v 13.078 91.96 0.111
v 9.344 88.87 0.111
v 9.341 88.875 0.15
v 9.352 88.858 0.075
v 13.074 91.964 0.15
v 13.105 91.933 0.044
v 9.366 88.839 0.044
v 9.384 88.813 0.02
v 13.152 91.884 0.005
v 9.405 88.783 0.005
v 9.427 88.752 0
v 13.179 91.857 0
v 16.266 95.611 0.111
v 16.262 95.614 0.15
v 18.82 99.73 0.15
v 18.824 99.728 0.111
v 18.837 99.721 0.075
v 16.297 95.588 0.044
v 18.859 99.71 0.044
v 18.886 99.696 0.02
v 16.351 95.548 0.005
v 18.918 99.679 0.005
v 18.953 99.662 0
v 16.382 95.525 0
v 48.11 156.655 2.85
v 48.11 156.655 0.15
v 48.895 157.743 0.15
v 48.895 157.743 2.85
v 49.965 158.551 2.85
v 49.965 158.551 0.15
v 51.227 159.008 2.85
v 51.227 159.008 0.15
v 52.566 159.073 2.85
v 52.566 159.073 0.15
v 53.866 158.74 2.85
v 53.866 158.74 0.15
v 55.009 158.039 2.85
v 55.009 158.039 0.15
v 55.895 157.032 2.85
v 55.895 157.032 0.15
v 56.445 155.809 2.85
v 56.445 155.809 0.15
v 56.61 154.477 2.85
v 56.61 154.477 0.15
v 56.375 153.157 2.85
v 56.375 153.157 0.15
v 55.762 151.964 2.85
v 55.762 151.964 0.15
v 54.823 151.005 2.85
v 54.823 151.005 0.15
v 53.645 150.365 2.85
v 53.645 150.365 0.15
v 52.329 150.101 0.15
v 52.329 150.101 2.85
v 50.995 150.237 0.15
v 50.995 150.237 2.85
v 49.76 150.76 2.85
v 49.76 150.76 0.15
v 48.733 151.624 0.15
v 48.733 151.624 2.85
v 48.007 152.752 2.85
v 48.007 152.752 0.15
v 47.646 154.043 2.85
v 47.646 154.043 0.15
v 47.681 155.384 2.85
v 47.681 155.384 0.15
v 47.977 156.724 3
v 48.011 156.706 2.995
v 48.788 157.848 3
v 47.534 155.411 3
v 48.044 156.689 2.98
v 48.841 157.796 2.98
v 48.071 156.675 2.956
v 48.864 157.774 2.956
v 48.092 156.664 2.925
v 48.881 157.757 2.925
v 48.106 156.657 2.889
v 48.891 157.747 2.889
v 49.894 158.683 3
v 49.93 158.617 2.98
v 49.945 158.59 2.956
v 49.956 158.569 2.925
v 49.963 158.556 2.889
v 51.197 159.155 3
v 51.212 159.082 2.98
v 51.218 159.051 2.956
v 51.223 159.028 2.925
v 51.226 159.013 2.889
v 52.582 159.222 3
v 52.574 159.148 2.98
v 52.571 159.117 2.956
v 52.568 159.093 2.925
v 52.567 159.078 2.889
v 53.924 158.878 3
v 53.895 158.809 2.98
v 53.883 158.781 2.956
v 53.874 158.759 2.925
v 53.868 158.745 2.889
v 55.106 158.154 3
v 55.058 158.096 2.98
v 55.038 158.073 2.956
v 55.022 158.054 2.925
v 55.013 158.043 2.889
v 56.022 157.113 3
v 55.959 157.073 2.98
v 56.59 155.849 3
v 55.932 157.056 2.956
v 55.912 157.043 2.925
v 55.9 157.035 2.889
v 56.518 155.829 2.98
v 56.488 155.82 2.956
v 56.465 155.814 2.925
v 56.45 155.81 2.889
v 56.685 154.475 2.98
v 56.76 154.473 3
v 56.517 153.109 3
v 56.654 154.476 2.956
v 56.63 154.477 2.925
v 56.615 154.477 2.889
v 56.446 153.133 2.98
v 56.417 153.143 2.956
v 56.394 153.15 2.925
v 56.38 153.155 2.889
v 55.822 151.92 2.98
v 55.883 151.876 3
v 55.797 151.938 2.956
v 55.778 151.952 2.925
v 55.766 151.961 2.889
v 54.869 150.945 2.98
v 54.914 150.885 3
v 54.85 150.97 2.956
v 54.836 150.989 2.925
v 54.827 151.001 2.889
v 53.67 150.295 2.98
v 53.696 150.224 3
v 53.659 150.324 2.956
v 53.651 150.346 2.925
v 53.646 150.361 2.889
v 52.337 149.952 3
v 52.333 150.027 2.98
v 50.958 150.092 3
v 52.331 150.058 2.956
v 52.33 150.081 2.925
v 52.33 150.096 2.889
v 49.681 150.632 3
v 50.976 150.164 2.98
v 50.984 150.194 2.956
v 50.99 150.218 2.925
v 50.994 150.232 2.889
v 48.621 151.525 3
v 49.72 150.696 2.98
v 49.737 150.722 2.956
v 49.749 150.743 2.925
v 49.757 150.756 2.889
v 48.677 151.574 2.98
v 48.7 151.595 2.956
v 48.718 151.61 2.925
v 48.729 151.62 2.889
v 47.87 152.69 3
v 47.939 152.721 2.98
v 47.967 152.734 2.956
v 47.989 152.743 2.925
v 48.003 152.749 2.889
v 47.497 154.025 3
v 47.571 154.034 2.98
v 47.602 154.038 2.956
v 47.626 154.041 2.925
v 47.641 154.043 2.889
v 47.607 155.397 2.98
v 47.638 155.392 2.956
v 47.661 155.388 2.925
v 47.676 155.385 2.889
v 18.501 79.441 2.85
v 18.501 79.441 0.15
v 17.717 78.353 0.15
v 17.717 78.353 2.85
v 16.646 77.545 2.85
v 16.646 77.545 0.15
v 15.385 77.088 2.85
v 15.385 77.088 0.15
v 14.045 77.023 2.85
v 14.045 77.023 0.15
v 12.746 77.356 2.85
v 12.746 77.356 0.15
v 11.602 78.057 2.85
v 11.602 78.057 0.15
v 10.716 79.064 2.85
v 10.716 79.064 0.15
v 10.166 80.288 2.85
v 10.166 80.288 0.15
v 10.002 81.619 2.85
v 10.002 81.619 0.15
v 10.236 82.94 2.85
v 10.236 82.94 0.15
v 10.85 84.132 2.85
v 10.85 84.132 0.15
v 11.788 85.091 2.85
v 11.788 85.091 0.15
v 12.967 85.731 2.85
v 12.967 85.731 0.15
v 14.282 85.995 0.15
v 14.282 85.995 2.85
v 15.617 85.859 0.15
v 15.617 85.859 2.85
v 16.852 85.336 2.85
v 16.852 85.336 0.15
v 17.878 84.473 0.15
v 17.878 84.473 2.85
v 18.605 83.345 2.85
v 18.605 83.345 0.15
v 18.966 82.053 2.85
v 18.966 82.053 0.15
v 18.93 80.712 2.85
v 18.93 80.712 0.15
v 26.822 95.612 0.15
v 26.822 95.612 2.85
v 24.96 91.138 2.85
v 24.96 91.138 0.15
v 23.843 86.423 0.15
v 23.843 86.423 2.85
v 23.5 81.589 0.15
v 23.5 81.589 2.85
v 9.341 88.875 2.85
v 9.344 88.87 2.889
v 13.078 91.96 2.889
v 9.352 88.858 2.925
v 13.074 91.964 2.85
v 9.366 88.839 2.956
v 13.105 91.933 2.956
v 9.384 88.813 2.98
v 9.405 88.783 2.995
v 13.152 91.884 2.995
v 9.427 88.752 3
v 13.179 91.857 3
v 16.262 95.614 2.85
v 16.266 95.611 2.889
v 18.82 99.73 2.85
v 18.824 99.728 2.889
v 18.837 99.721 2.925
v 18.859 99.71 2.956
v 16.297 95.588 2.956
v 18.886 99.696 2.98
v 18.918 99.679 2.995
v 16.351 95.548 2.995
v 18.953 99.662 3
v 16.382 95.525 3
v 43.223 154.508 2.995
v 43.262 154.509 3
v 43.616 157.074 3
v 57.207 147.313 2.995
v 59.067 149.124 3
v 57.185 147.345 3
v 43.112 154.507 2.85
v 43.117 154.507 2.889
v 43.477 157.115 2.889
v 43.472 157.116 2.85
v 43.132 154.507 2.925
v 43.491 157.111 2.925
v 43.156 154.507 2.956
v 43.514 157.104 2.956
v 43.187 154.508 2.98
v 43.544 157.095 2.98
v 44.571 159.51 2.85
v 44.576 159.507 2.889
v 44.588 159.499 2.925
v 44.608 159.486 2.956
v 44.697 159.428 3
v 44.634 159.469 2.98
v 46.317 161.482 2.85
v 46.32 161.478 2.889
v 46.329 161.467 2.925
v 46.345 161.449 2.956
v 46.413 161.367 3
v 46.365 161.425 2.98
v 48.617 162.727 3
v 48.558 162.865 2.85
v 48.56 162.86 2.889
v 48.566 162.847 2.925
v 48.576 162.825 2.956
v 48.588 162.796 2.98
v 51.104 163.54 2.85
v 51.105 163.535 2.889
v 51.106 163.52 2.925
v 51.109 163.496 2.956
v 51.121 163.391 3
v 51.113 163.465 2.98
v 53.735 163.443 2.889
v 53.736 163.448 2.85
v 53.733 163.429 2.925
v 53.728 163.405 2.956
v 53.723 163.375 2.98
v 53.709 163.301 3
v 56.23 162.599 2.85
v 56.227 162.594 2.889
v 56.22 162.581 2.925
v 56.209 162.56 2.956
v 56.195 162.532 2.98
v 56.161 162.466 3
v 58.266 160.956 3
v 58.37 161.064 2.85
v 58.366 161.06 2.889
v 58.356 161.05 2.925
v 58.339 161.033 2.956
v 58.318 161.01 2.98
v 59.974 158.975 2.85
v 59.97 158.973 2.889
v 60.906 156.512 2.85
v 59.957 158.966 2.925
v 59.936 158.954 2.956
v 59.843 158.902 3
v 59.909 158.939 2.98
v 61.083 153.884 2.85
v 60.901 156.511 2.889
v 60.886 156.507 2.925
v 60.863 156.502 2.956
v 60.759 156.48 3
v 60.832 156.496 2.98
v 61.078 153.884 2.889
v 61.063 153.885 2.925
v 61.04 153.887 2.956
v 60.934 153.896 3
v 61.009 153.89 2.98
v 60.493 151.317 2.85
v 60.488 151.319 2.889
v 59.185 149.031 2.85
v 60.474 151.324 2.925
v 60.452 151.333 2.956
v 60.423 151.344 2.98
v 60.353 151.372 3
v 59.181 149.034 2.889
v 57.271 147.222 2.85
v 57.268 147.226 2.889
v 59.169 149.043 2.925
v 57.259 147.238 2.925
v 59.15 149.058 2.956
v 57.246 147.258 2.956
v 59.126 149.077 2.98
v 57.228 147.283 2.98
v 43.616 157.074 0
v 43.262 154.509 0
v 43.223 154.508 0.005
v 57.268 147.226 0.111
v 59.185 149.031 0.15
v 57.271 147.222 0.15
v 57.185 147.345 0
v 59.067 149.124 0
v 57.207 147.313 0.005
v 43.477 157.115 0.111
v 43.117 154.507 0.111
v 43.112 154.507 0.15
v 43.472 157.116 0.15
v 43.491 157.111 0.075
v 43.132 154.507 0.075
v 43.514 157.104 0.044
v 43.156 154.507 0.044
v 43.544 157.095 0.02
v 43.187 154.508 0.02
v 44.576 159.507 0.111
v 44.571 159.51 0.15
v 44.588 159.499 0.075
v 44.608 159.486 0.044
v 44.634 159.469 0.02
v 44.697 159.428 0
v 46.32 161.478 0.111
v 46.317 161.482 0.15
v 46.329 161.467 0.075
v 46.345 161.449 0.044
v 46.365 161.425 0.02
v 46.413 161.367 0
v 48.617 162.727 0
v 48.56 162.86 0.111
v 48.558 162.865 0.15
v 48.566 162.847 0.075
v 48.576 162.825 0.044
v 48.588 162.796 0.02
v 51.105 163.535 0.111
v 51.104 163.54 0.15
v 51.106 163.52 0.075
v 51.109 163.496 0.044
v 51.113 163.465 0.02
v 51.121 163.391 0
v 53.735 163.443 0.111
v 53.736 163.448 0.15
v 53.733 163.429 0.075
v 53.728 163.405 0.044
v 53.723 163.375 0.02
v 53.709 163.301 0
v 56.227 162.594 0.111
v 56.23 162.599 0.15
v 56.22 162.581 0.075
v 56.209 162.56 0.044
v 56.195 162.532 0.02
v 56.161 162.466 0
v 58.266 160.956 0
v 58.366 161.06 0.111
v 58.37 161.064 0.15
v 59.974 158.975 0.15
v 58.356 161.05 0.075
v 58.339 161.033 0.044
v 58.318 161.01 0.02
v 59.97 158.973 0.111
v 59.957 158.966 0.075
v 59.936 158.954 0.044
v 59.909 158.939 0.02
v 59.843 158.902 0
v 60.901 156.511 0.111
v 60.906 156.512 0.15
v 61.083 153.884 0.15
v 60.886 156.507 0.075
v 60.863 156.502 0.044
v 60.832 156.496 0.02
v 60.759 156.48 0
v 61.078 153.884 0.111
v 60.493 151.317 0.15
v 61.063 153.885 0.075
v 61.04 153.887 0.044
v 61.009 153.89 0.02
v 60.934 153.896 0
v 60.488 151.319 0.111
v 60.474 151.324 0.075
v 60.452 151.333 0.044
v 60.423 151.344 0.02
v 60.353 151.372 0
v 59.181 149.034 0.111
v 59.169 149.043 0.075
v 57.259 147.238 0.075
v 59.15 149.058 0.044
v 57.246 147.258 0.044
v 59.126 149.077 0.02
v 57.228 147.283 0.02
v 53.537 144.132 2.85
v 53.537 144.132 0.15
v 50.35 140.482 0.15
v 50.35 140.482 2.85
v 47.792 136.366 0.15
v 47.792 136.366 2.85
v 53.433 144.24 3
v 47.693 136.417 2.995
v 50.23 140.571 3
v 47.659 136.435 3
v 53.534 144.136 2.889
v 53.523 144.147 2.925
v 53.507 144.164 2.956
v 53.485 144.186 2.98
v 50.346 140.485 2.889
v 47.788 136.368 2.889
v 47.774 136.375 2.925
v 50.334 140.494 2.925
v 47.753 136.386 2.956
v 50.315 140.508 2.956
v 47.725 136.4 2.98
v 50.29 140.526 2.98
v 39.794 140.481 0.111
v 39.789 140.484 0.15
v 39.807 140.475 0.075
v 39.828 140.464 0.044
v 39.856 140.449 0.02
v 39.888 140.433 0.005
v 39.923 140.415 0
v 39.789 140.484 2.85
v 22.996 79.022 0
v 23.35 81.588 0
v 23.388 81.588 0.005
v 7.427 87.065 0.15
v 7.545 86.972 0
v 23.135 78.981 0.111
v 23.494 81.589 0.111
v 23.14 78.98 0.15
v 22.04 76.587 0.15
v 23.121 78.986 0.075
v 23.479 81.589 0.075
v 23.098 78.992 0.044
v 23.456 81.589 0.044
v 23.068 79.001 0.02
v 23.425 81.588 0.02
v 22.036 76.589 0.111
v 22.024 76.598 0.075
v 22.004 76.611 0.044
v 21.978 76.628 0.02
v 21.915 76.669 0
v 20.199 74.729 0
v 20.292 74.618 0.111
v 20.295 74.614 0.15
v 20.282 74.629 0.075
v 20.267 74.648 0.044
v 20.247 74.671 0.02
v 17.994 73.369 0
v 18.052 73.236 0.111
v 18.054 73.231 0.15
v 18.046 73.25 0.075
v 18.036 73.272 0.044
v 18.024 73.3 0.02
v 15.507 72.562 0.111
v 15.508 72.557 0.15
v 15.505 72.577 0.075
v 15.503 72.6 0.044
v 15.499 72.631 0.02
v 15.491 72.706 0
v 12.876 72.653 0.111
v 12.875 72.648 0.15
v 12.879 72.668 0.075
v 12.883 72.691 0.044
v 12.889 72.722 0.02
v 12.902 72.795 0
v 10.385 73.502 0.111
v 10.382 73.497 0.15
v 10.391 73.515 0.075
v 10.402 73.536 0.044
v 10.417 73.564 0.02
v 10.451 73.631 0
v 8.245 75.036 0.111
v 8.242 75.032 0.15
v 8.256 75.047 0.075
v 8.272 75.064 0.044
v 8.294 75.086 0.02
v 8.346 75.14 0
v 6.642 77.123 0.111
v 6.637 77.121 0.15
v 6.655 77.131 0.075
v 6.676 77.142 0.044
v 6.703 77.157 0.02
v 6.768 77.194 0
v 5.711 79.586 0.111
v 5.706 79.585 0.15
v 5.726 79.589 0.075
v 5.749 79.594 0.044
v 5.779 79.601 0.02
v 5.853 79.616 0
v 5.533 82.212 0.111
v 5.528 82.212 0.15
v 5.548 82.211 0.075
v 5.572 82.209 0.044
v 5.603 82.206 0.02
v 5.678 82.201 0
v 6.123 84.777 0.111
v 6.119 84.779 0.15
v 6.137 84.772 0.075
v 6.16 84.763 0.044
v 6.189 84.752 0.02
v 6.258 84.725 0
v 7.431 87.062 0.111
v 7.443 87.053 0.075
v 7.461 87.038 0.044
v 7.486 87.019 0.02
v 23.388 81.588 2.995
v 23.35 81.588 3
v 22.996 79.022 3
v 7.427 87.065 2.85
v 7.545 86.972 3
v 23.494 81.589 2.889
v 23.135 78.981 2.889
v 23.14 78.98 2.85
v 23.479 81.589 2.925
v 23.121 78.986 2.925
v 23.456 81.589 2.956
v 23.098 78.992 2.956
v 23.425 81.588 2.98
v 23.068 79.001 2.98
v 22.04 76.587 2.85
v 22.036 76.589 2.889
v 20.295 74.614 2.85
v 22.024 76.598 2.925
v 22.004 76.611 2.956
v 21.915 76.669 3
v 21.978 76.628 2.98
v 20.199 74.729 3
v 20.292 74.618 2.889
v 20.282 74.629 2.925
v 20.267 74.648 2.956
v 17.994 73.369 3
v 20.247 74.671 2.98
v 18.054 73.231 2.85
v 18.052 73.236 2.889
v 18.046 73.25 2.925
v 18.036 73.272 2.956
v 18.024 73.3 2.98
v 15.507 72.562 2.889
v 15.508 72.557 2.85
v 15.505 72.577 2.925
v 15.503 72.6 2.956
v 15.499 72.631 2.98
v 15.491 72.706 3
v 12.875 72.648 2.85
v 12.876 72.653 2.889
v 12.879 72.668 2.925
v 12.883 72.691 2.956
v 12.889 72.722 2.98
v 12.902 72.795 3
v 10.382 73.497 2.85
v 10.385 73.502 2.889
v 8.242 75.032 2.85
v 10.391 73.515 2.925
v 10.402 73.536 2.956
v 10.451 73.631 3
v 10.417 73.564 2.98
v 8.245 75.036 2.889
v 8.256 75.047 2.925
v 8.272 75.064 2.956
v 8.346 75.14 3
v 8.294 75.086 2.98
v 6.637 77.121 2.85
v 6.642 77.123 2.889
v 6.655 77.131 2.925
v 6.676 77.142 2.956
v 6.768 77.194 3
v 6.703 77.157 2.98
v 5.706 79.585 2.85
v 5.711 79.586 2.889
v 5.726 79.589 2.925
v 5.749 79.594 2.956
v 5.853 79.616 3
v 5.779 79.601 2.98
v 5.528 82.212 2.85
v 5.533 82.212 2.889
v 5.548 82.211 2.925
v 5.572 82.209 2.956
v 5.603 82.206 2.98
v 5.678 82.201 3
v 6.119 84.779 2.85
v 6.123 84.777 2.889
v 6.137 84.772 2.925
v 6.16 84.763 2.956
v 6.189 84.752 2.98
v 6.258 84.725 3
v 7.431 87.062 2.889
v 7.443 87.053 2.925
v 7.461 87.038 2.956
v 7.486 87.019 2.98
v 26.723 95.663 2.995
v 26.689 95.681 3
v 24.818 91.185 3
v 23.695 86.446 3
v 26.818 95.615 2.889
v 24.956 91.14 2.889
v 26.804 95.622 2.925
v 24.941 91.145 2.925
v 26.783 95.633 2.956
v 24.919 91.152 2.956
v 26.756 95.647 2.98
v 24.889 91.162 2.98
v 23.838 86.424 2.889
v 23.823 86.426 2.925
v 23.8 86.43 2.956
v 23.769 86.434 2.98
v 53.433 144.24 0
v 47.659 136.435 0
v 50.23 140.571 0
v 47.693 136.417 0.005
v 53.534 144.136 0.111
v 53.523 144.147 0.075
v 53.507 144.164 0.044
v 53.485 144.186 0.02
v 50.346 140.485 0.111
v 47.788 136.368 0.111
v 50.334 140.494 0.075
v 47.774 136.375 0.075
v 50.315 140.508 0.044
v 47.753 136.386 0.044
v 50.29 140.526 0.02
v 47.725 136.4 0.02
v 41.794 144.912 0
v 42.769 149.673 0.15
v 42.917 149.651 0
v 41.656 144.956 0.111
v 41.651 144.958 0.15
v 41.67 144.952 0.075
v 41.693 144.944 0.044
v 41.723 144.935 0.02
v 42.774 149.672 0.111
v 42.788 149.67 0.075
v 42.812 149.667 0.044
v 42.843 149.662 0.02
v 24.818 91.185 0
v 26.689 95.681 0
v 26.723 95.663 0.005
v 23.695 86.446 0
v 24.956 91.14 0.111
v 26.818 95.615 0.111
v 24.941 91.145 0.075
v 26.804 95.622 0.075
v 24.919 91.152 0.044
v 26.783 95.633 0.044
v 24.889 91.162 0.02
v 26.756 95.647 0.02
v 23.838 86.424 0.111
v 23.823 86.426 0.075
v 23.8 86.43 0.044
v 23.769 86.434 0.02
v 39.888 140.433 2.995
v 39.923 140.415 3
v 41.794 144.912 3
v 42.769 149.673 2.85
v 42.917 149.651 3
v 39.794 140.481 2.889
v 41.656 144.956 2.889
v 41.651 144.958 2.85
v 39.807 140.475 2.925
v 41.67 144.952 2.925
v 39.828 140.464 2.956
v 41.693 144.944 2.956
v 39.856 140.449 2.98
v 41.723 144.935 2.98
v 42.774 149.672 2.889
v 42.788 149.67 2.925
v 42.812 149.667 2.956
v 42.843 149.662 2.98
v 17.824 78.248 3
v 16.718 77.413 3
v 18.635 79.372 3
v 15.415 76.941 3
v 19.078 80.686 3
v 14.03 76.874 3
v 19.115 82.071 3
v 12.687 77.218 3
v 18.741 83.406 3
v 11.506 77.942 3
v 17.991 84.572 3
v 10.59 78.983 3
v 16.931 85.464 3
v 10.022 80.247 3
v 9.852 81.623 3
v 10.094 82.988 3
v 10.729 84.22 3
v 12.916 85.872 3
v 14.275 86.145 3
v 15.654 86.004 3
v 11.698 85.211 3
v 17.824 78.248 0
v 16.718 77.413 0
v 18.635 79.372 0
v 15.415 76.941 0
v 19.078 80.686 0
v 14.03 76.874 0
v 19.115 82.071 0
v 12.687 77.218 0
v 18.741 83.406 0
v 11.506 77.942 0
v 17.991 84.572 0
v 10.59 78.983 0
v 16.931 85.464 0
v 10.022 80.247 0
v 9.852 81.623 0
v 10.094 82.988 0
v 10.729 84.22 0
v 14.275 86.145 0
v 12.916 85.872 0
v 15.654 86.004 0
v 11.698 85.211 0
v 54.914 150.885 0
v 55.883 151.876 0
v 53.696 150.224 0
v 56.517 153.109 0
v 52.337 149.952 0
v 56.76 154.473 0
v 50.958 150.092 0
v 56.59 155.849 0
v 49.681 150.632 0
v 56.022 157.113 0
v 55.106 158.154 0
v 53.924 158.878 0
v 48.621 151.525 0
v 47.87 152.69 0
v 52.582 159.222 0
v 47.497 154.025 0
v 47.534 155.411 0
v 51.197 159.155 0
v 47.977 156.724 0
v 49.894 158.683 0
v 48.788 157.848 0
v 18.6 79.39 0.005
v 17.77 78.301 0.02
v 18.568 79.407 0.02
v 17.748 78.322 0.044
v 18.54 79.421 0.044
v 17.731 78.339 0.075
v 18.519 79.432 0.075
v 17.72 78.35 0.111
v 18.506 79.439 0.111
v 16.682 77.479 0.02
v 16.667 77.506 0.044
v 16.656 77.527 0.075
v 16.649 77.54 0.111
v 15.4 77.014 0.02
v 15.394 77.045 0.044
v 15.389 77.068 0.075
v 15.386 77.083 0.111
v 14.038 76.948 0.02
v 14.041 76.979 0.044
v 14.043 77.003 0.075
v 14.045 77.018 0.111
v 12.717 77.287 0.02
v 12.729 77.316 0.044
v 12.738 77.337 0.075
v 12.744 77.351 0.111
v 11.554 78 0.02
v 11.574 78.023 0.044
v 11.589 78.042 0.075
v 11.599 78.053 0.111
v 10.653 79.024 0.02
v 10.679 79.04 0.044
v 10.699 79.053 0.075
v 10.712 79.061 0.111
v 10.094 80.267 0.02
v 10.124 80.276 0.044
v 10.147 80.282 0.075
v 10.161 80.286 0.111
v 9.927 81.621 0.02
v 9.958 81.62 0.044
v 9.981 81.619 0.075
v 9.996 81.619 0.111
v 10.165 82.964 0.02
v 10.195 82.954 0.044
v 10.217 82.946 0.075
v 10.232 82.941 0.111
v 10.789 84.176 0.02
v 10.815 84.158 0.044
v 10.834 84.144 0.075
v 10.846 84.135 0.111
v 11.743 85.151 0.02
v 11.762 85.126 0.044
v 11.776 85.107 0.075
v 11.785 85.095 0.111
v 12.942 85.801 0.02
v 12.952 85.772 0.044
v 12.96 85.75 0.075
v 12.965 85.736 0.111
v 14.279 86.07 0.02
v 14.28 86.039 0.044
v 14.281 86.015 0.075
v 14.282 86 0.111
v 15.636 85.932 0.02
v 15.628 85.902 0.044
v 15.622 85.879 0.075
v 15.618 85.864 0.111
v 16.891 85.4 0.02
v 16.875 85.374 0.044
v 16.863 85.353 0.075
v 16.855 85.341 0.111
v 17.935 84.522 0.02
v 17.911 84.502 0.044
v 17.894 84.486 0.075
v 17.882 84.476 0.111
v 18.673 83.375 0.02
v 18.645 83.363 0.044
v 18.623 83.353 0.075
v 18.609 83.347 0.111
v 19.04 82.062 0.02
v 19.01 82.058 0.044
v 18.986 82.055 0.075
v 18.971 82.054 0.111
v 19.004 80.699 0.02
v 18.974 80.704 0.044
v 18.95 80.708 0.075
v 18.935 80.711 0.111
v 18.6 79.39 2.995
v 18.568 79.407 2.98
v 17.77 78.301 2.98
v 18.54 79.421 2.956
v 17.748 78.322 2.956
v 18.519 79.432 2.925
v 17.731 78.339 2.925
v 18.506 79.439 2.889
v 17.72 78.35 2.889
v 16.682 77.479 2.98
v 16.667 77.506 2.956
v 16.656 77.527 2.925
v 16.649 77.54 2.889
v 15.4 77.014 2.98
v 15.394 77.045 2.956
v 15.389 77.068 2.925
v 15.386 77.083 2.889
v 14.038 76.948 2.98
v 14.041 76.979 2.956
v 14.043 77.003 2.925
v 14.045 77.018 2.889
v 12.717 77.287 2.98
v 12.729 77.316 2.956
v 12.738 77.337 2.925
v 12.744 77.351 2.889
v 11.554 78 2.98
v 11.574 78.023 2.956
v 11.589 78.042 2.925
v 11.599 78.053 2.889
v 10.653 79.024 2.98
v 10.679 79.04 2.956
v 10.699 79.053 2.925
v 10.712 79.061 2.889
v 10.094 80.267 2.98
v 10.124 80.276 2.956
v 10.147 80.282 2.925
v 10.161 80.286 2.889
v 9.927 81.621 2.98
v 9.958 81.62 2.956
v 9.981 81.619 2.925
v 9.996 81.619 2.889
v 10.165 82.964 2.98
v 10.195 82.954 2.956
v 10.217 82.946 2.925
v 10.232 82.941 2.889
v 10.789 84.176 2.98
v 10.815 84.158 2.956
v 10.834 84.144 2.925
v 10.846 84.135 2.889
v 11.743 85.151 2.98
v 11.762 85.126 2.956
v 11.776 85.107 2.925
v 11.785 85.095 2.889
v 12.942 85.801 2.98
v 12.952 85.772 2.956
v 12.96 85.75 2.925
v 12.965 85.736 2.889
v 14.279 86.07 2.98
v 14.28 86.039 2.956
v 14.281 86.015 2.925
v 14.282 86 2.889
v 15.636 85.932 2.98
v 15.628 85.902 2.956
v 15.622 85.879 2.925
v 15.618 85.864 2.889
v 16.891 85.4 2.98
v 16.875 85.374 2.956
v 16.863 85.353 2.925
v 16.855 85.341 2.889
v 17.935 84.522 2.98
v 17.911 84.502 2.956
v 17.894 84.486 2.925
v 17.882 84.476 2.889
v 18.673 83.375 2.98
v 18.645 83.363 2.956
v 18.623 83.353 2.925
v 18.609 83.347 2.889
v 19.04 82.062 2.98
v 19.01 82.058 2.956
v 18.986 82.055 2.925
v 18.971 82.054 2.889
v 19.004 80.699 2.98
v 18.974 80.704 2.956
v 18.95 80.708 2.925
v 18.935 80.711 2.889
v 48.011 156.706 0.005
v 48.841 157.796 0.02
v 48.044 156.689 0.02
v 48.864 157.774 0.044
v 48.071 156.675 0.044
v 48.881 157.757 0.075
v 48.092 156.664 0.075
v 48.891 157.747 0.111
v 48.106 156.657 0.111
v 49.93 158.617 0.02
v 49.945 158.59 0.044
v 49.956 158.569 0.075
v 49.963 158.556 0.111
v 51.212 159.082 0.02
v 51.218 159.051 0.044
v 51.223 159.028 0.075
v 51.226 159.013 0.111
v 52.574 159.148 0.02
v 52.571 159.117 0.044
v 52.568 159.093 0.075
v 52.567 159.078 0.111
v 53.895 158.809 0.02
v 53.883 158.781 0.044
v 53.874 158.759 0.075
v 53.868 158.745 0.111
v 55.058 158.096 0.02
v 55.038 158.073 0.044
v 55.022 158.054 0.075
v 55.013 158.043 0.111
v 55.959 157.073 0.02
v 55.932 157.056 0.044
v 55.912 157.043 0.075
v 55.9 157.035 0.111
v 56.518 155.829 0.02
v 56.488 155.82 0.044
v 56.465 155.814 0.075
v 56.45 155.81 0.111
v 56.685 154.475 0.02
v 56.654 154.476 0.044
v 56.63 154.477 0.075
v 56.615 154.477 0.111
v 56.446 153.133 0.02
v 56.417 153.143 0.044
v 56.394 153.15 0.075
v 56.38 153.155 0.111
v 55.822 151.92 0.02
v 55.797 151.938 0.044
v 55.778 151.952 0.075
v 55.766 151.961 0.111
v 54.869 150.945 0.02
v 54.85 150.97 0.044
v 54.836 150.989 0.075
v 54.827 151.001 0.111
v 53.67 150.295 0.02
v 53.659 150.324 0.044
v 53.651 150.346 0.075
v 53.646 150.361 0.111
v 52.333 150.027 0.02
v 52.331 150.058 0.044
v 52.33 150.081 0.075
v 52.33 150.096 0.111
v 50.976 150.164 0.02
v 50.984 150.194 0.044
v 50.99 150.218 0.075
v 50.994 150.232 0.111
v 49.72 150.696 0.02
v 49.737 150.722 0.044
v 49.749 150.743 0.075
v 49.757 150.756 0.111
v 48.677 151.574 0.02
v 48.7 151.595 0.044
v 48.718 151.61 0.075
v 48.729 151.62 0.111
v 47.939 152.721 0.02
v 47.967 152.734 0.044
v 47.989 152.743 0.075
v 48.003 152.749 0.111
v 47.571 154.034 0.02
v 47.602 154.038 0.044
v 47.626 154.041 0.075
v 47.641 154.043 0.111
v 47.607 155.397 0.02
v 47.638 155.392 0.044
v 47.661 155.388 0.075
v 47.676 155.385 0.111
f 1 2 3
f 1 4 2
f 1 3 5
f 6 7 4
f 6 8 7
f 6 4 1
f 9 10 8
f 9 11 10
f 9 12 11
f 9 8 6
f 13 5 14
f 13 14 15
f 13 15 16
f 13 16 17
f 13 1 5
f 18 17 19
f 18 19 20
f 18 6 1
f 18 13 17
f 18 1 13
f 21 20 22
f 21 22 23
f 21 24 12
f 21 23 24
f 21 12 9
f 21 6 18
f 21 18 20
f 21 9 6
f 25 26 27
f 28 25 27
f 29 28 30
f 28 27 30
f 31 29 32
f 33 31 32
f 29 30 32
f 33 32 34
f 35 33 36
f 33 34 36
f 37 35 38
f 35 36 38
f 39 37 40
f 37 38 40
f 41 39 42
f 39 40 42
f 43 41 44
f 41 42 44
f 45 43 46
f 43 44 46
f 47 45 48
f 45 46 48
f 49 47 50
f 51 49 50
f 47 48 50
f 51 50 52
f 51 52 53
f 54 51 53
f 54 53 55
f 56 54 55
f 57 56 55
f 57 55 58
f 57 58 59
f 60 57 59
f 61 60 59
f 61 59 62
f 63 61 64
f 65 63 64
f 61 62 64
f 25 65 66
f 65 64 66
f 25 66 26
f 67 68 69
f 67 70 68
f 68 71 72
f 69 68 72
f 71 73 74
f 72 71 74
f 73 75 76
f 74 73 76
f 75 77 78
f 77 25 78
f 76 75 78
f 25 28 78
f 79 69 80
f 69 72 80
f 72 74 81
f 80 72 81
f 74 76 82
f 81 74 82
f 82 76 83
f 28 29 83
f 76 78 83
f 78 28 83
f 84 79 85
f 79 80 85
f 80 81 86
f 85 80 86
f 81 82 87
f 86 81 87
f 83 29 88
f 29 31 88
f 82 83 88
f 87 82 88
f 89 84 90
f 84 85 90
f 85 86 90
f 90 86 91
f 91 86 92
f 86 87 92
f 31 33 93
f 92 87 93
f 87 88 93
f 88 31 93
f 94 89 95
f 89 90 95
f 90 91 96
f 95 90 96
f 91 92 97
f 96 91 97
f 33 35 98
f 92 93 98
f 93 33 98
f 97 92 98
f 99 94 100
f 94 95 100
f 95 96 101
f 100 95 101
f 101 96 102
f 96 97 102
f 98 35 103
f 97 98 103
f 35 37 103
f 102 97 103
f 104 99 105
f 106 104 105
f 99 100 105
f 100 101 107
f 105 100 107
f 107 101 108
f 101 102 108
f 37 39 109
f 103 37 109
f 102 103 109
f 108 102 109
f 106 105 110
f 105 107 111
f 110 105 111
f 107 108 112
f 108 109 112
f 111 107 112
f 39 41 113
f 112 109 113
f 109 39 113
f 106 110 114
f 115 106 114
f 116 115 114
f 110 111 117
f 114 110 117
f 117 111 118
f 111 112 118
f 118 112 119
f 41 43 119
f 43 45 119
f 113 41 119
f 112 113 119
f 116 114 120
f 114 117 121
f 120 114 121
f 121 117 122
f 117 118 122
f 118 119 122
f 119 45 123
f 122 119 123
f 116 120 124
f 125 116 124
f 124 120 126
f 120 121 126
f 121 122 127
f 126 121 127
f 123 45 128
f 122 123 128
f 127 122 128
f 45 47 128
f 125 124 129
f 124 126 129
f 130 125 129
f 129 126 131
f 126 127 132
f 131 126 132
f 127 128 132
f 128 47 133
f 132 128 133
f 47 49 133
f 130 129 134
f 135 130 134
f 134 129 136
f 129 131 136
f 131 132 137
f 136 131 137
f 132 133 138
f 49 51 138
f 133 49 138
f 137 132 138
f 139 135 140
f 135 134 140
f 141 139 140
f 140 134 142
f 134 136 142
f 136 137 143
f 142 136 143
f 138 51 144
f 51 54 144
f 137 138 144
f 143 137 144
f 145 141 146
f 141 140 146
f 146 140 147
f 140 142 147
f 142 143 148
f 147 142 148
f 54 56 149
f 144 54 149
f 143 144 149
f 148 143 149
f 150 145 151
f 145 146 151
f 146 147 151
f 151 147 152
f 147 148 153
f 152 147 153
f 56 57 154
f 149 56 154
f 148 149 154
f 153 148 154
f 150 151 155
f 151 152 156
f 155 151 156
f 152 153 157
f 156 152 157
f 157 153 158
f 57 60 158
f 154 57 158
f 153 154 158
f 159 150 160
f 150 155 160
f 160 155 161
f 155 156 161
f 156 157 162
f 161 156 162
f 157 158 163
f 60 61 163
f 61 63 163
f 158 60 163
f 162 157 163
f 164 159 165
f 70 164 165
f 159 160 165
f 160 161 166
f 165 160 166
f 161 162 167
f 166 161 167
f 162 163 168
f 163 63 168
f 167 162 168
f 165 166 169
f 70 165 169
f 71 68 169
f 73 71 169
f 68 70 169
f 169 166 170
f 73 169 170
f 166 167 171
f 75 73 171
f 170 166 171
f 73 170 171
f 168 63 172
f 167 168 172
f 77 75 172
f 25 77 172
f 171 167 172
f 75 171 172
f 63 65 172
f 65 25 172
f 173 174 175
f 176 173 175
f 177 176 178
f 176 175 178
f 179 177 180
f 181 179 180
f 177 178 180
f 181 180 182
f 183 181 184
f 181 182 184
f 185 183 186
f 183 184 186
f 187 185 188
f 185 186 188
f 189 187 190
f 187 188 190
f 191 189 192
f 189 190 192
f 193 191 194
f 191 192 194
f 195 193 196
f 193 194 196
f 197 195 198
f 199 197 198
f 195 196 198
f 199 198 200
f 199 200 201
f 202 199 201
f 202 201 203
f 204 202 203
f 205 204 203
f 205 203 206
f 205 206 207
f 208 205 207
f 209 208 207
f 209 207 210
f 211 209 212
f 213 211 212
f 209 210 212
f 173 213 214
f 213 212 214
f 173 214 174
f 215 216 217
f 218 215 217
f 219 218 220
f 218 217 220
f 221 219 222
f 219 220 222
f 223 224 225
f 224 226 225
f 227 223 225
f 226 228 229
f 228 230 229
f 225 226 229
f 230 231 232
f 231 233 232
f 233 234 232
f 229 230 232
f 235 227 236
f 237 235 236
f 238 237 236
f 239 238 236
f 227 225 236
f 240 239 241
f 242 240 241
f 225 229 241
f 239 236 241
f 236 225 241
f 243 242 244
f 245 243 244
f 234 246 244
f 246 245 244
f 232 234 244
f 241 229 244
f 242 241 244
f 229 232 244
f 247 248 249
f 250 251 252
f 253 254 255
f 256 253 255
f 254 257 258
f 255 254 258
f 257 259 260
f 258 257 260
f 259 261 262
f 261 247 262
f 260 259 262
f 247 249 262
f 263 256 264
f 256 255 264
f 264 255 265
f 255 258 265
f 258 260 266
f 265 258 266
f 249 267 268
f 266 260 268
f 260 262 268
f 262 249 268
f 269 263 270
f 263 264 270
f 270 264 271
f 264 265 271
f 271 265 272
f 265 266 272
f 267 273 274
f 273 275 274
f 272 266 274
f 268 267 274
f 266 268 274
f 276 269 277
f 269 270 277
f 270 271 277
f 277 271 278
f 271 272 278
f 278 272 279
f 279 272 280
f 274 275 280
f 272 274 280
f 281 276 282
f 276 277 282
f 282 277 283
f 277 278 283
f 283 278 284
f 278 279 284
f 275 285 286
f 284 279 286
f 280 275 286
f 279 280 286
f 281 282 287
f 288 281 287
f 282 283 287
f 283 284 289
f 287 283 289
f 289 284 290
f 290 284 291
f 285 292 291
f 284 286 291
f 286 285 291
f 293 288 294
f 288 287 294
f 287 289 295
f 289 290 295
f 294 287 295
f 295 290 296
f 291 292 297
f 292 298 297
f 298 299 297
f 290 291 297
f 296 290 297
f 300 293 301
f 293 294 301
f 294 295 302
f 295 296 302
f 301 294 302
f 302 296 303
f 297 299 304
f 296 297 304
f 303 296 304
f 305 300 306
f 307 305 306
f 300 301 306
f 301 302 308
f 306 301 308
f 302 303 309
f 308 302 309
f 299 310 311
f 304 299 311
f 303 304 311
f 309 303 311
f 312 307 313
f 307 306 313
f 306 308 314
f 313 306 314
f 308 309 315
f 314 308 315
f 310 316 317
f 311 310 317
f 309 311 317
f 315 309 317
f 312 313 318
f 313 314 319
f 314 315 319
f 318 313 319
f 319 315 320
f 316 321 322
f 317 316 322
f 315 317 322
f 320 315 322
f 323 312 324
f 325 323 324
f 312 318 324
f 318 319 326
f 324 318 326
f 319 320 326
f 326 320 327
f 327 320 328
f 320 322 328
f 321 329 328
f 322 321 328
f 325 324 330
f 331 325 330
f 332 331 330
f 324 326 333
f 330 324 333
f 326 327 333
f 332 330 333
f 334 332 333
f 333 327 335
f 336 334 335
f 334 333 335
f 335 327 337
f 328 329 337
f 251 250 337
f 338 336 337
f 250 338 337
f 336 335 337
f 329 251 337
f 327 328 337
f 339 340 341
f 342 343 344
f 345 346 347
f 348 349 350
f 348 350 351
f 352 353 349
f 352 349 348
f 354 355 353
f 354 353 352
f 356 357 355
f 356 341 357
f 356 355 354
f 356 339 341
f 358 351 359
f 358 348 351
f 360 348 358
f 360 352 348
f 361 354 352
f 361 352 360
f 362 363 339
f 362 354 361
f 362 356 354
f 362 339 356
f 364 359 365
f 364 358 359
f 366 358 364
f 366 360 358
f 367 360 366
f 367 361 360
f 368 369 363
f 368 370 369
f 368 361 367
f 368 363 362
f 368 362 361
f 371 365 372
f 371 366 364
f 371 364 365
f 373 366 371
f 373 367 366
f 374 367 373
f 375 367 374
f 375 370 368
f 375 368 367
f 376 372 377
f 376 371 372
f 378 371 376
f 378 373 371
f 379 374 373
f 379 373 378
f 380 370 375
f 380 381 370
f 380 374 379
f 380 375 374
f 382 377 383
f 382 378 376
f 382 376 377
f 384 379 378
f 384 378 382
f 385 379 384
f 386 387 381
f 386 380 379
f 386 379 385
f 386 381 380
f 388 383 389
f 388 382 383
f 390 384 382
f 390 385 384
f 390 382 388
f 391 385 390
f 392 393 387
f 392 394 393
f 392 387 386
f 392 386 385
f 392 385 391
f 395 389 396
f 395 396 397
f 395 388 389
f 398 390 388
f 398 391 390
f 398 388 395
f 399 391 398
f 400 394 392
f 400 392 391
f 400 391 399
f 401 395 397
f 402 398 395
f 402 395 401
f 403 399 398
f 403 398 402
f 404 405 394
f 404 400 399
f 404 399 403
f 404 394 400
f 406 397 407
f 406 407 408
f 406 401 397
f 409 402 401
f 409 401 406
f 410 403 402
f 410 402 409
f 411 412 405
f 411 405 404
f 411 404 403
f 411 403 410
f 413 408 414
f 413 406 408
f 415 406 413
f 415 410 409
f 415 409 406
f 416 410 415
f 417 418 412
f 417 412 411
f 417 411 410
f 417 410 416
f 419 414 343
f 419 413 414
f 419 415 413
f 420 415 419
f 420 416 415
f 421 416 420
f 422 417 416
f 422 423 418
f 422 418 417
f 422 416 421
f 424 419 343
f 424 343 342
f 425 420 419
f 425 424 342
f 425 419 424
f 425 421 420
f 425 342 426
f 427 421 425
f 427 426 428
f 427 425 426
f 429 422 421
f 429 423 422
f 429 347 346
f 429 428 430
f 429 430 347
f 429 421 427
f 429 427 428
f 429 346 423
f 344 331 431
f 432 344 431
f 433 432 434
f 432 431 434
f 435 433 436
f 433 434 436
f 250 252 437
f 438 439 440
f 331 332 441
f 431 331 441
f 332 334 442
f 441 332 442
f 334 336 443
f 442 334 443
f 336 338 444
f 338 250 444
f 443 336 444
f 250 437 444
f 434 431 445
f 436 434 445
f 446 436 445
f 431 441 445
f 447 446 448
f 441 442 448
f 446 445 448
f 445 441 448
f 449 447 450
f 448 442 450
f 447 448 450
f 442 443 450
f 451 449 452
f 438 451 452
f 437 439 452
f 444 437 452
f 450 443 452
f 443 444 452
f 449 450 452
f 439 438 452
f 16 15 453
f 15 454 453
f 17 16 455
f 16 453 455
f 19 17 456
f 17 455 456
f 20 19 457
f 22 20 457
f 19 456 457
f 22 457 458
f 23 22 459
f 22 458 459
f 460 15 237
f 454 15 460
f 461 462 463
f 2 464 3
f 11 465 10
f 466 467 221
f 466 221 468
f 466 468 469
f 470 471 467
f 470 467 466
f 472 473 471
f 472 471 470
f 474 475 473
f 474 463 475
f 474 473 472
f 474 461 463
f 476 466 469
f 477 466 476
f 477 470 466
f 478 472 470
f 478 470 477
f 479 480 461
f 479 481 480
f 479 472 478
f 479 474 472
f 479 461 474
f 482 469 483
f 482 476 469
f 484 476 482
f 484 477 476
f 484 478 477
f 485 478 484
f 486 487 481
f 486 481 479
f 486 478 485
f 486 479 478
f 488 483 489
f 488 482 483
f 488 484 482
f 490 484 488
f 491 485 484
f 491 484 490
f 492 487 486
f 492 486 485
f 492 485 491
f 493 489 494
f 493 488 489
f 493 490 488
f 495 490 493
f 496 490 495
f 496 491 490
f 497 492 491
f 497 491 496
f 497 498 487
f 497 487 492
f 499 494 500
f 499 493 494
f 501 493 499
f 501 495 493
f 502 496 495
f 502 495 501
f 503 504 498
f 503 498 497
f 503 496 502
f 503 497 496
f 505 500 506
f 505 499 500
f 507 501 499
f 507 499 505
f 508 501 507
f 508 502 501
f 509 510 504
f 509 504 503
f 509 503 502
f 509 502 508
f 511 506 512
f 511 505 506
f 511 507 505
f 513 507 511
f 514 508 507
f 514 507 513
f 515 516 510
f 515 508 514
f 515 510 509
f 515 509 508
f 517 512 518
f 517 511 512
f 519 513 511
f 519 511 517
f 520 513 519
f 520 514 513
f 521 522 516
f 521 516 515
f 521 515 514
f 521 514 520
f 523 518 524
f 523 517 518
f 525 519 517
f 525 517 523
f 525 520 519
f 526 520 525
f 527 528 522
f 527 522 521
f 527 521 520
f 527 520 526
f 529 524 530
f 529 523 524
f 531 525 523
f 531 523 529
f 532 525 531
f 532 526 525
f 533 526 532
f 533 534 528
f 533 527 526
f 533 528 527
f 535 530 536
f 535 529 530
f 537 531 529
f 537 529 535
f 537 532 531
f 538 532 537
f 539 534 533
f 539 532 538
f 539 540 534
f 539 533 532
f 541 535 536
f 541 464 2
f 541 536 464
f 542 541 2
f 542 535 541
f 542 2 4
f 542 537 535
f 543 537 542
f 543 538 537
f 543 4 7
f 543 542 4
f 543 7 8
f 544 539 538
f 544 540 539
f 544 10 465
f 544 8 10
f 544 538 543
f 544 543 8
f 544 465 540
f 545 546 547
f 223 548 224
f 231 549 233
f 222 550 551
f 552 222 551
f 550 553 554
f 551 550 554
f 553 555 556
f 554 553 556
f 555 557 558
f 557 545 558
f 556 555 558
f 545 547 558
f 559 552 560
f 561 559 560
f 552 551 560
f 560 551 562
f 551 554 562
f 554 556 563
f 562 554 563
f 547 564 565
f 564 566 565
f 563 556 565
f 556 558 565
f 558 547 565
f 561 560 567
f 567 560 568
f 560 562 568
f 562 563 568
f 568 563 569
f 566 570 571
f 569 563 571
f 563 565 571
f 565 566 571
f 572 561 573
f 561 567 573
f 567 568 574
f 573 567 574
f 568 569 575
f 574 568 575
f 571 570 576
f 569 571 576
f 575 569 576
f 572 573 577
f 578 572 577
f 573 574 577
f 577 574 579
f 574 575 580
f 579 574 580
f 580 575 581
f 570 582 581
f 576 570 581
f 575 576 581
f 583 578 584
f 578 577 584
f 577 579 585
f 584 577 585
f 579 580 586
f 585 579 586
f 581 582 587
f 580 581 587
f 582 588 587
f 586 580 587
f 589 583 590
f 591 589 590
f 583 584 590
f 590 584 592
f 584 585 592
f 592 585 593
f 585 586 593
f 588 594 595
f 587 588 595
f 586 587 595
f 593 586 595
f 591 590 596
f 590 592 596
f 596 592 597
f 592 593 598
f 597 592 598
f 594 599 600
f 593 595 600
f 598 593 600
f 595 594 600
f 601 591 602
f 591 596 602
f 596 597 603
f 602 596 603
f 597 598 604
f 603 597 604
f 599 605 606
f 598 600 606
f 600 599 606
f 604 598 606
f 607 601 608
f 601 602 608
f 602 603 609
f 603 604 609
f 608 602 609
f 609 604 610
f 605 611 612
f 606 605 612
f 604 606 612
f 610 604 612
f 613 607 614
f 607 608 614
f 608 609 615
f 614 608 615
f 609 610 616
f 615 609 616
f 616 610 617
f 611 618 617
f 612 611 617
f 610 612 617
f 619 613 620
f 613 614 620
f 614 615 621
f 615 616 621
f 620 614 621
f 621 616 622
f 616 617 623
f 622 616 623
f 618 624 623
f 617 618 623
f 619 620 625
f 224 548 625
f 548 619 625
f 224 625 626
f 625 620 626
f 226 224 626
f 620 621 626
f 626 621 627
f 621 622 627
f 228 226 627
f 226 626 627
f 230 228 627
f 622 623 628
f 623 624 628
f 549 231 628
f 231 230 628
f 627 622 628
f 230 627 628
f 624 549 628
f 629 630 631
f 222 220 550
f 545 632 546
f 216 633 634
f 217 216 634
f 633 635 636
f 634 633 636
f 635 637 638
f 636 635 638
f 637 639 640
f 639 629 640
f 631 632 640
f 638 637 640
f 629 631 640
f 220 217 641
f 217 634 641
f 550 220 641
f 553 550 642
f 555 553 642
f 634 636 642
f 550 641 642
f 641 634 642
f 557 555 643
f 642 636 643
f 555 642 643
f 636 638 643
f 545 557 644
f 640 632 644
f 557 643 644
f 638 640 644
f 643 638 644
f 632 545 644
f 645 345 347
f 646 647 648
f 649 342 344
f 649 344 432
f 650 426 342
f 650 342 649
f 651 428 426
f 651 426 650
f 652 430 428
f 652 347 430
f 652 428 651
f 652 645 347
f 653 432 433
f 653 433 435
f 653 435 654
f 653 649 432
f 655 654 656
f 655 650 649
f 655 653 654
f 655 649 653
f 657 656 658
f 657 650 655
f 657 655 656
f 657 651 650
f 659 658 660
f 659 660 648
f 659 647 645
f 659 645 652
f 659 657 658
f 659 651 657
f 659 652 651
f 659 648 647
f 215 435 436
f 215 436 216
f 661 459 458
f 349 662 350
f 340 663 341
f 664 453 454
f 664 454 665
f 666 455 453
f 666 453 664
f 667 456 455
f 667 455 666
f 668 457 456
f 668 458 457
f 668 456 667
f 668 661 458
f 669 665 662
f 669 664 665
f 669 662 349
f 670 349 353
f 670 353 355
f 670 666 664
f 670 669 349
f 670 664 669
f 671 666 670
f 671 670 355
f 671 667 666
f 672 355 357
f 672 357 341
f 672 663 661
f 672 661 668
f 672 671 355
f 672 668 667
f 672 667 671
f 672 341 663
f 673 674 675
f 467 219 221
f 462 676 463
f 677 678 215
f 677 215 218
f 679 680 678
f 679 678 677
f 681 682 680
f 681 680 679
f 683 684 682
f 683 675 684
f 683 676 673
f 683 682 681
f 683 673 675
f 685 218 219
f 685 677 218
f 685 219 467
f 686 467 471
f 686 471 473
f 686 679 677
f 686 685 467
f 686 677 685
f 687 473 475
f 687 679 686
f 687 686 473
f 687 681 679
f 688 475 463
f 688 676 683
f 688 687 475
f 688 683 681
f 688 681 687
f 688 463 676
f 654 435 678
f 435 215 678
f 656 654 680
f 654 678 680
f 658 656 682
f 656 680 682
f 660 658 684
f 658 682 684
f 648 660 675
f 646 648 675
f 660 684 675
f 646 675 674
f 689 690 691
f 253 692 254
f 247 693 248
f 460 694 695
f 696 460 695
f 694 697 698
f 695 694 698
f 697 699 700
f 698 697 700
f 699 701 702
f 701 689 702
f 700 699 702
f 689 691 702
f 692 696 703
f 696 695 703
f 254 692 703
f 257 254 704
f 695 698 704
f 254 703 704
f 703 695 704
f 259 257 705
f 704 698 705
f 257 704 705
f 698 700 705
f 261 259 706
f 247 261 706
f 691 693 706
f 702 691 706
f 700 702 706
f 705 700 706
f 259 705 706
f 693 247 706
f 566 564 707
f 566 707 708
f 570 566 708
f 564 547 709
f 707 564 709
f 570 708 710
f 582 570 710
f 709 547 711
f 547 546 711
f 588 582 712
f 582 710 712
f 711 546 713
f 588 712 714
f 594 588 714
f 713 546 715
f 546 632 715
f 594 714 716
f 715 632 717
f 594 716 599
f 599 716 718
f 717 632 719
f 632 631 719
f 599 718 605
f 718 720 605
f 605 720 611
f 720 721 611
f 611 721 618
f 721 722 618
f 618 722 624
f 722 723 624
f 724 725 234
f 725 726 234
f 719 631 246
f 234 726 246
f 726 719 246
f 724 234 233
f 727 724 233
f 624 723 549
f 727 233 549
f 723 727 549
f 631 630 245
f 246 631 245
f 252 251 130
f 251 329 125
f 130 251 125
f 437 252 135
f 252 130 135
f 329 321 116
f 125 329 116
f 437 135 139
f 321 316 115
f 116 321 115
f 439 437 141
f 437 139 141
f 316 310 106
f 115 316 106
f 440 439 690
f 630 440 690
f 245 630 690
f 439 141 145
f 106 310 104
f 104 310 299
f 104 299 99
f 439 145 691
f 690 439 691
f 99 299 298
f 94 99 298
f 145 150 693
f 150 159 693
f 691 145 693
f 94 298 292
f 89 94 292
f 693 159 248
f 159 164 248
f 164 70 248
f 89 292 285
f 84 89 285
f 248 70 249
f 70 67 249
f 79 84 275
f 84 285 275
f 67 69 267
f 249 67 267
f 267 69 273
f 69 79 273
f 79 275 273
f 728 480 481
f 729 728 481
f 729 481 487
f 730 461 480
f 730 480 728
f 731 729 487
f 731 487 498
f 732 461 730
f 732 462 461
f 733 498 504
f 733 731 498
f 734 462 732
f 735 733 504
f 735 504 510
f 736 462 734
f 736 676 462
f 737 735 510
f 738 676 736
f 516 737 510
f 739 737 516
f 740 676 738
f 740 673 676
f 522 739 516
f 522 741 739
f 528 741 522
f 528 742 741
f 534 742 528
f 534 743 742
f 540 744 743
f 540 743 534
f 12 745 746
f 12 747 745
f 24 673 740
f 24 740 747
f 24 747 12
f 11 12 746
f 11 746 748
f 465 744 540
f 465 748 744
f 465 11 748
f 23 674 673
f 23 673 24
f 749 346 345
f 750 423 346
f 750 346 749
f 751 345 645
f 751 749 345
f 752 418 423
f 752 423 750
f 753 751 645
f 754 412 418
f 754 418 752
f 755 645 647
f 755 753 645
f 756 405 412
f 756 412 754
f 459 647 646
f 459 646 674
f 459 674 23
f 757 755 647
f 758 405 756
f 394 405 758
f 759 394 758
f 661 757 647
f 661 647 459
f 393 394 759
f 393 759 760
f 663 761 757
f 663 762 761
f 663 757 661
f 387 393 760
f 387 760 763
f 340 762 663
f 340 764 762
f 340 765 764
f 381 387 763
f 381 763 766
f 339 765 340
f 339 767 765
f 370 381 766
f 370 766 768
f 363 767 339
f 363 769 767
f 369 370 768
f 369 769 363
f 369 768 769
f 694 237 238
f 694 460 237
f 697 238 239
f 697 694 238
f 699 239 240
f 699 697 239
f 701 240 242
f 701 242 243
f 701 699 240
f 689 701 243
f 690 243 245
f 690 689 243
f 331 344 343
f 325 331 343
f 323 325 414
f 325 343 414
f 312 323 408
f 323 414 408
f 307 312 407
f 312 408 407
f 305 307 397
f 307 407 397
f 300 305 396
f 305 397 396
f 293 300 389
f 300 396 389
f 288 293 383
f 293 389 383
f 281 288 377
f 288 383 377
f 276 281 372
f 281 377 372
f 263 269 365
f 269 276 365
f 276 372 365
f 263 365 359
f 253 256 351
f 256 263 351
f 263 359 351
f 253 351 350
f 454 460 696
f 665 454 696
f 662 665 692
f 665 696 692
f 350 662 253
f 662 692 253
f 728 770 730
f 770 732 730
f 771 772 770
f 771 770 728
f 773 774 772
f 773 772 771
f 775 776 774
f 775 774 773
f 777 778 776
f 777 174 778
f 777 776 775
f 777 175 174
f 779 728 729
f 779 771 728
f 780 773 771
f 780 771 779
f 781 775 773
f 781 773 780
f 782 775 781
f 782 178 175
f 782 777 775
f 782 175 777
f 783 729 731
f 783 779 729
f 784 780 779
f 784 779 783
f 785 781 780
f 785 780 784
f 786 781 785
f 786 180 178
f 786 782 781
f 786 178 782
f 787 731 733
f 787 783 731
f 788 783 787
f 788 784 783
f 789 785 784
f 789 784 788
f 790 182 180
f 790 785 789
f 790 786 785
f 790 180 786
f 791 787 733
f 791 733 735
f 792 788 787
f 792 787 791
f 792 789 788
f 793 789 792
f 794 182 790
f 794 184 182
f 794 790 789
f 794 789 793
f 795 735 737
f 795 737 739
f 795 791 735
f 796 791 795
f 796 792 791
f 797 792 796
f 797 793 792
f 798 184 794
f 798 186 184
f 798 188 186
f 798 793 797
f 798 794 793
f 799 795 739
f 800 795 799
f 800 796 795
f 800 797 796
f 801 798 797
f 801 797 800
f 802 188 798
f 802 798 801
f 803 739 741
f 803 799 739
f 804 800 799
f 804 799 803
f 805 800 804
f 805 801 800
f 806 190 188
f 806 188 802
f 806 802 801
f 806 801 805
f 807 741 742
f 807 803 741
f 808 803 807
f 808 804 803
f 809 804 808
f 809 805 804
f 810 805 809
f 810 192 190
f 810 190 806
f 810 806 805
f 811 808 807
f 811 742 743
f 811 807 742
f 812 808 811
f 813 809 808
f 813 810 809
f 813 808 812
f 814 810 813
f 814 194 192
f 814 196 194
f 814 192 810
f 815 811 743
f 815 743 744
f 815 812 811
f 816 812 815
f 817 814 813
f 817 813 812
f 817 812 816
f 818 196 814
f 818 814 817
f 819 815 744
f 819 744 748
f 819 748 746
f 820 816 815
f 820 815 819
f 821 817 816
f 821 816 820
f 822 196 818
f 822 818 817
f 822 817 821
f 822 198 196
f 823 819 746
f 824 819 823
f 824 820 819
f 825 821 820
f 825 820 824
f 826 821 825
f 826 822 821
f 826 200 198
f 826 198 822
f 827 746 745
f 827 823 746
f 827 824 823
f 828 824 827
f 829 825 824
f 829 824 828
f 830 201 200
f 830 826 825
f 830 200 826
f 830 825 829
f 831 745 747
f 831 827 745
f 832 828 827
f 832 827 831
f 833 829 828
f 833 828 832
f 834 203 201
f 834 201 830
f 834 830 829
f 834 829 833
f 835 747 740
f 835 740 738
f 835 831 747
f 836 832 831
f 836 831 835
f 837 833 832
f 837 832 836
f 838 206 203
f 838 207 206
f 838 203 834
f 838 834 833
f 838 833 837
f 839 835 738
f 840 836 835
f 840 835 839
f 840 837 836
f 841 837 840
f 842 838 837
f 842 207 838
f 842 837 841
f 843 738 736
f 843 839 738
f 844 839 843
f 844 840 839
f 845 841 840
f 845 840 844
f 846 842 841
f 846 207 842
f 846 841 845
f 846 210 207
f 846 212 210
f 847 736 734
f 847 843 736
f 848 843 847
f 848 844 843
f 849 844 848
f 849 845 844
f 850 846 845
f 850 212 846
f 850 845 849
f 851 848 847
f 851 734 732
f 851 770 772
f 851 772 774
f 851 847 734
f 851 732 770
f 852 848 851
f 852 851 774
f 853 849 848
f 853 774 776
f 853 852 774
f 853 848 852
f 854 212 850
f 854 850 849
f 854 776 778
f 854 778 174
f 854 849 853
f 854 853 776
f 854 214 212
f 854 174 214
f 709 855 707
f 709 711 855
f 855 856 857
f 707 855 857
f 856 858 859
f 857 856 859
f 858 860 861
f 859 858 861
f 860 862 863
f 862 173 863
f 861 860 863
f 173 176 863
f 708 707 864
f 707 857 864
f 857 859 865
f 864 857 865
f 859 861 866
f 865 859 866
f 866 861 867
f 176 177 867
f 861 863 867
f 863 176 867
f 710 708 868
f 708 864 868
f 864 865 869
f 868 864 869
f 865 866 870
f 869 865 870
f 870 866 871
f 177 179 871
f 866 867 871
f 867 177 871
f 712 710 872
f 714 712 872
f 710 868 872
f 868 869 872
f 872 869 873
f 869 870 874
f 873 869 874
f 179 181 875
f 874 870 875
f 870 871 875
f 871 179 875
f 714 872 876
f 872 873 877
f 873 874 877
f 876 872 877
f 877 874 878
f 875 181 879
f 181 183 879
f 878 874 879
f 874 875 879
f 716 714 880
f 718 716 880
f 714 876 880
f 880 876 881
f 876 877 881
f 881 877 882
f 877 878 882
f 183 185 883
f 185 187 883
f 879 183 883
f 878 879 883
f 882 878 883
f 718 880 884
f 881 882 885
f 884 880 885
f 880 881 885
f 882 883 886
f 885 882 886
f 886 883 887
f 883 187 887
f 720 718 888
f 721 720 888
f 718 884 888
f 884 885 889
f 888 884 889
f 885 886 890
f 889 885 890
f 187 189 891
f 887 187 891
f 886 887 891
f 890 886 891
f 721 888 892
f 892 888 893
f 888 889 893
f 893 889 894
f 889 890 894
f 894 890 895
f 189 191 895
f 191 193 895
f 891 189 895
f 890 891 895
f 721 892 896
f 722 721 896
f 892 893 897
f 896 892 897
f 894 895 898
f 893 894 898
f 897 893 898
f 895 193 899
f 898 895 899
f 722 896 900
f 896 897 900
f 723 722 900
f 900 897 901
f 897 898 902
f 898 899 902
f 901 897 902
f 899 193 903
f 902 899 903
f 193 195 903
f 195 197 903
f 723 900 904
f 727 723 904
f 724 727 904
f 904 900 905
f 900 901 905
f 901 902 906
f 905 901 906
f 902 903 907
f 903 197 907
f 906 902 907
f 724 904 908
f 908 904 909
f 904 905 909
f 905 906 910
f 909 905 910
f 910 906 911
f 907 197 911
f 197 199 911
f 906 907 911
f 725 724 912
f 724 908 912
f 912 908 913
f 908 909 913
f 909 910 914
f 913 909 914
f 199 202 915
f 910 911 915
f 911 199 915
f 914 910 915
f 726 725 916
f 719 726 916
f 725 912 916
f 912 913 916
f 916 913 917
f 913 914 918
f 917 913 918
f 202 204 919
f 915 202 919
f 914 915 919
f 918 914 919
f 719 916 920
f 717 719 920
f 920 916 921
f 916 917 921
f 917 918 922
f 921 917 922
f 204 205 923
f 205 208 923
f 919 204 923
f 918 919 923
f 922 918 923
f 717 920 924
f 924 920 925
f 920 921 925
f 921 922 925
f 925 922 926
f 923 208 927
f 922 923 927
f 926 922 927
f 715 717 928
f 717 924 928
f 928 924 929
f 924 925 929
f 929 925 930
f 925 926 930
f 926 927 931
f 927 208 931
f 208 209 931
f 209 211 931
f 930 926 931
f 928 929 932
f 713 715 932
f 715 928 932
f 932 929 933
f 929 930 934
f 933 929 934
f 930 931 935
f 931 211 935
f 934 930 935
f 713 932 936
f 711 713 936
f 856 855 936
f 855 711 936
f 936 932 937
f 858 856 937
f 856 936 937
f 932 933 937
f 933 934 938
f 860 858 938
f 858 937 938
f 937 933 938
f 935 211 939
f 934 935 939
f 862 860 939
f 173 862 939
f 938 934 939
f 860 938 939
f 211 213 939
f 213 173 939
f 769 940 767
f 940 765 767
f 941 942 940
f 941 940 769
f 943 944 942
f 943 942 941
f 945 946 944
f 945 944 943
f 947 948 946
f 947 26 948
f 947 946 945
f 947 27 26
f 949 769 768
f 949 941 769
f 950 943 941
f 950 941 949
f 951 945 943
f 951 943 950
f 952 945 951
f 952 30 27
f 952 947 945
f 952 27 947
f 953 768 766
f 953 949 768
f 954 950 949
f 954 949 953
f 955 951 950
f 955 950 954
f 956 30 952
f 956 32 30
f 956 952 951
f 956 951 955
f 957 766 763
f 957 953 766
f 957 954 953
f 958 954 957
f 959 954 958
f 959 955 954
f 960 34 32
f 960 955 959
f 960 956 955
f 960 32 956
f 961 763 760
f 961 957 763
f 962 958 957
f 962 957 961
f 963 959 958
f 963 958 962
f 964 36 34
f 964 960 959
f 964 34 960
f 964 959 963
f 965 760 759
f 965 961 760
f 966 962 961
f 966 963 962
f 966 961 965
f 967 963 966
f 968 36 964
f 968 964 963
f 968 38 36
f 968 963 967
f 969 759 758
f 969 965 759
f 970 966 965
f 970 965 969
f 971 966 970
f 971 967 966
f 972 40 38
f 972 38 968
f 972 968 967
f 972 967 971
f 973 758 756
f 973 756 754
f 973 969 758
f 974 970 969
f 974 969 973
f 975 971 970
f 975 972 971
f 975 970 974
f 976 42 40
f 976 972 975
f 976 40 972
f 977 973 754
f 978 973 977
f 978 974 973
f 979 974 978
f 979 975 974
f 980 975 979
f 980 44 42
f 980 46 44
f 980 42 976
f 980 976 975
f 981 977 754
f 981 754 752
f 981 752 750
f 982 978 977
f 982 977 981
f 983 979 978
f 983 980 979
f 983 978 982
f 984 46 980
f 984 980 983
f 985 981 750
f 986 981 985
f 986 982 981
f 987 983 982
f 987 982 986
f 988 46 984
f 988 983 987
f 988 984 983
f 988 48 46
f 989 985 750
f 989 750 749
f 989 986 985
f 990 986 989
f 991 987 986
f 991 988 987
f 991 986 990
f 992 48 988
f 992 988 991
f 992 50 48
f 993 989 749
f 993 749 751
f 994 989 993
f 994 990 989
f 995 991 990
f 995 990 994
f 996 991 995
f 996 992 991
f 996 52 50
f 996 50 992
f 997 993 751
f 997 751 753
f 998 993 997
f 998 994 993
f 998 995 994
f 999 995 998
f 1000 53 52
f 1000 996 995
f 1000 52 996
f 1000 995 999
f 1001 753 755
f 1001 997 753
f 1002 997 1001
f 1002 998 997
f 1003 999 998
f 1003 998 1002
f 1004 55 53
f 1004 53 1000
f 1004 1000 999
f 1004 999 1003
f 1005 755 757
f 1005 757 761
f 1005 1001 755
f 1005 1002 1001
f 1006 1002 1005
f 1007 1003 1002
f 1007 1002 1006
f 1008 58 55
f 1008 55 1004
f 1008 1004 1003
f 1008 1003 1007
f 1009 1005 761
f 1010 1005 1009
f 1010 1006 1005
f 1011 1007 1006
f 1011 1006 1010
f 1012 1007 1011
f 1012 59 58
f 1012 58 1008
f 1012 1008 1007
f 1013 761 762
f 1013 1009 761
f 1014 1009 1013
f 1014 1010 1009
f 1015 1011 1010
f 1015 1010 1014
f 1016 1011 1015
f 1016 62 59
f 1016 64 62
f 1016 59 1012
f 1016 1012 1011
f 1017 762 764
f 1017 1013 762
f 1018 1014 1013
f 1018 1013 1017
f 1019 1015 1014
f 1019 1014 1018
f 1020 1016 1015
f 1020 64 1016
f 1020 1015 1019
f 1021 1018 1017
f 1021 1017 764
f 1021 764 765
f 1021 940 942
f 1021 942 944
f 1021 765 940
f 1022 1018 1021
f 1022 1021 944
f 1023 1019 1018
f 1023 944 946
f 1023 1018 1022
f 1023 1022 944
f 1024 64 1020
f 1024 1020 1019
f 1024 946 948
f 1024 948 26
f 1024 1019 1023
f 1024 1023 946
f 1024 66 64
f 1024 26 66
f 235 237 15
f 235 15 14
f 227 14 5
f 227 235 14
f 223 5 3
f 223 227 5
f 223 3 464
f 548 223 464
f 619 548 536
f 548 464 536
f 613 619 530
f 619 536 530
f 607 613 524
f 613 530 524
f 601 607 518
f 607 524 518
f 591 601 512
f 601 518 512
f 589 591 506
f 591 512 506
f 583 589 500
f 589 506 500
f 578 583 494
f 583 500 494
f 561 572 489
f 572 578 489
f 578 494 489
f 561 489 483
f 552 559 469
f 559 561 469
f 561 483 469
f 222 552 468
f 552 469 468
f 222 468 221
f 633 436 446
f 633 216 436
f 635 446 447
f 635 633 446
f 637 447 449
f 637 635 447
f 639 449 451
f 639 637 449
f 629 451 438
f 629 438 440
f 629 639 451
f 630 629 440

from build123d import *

# Parameters (mm, degrees)
BOSS_EXTRUDE1_DEPTH = 3
FILLET1_R           = 30
FILLET2_R           = 0.15


with BuildPart() as part:
    # Sketch1 → Boss-Extrude1 (new body)
    with BuildSketch(Plane.XY):
        with BuildLine():
            Line((10.498636235, 83.558904567), (48.11035062, 156.655129366))
            ThreePointArc((48.11035062, 156.655129366), (50.052809818, 150.594861033), (56.113078151, 152.537320231))
            Line((56.113078151, 152.537320231), (18.501363765, 79.441095433))
            ThreePointArc((18.501363765, 79.441095433), (16.558904567, 85.501363765), (10.498636235, 83.558904567))
        make_face()
        with BuildLine():
            ThreePointArc((52.546950832, 145.60675489), (56.22952352, 162.598952329), (44.544223302, 149.724564025))
            Line((44.544223302, 149.724564025), (48.11035062, 156.655129366))
            ThreePointArc((48.11035062, 156.655129366), (54.170618953, 158.597588564), (56.113078151, 152.537320231))
            Line((56.113078151, 152.537320231), (52.546950832, 145.60675489))
        make_face()
        with BuildLine():
            ThreePointArc((18.501363765, 79.441095433), (12.441095433, 77.498636235), (10.498636235, 83.558904567))
            Line((10.498636235, 83.558904567), (14.064763553, 90.489469908))
            ThreePointArc((14.064763553, 90.489469908), (10.382190865, 73.497272469), (22.067491084, 86.371660774))
            Line((22.067491084, 86.371660774), (18.501363765, 79.441095433))
        make_face()
    extrude(amount=BOSS_EXTRUDE1_DEPTH)

    # Fillet1
    fillet1_edges = [part.edges().sort_by_distance(p)[0] for p in [
        (44.544223302, 149.724564025, 1.5),
        (52.546950832, 145.60675489, 1.5),
        (22.067491084, 86.371660774, 1.5),
        (14.064763553, 90.489469908, 1.5),
    ]]
    fillet(fillet1_edges, radius=FILLET1_R)

    # Fillet2
    fillet2_edges = [part.edges().sort_by_distance(p)[0] for p in [
        (56.113078151, 152.537320231, 3),
        (29.304493428, 120.107016967, 0),
        (29.304493428, 120.107016967, 3),
        (56.22952352, 162.598952329, 0),
        (56.22952352, 162.598952329, 3),
        (37.307220958, 115.989207832, 0),
        (37.307220958, 115.989207832, 3),
        (10.498636235, 83.558904567, 3),
        (10.382190865, 73.497272469, 0),
        (10.382190865, 73.497272469, 3),
        (42.305349081, 147.292944989, 0),
        (42.305349081, 147.292944989, 3),
        (51.869923948, 142.371486199, 0),
        (51.869923948, 142.371486199, 3),
        (24.306365304, 88.80327981, 0),
        (24.306365304, 88.80327981, 3),
        (14.741790438, 93.7247386, 0),
        (14.741790438, 93.7247386, 3),
        (10.498636235, 83.558904567, 0),
        (56.113078151, 152.537320231, 0),
    ]]
    fillet(fillet2_edges, radius=FILLET2_R)


solid = part.part
